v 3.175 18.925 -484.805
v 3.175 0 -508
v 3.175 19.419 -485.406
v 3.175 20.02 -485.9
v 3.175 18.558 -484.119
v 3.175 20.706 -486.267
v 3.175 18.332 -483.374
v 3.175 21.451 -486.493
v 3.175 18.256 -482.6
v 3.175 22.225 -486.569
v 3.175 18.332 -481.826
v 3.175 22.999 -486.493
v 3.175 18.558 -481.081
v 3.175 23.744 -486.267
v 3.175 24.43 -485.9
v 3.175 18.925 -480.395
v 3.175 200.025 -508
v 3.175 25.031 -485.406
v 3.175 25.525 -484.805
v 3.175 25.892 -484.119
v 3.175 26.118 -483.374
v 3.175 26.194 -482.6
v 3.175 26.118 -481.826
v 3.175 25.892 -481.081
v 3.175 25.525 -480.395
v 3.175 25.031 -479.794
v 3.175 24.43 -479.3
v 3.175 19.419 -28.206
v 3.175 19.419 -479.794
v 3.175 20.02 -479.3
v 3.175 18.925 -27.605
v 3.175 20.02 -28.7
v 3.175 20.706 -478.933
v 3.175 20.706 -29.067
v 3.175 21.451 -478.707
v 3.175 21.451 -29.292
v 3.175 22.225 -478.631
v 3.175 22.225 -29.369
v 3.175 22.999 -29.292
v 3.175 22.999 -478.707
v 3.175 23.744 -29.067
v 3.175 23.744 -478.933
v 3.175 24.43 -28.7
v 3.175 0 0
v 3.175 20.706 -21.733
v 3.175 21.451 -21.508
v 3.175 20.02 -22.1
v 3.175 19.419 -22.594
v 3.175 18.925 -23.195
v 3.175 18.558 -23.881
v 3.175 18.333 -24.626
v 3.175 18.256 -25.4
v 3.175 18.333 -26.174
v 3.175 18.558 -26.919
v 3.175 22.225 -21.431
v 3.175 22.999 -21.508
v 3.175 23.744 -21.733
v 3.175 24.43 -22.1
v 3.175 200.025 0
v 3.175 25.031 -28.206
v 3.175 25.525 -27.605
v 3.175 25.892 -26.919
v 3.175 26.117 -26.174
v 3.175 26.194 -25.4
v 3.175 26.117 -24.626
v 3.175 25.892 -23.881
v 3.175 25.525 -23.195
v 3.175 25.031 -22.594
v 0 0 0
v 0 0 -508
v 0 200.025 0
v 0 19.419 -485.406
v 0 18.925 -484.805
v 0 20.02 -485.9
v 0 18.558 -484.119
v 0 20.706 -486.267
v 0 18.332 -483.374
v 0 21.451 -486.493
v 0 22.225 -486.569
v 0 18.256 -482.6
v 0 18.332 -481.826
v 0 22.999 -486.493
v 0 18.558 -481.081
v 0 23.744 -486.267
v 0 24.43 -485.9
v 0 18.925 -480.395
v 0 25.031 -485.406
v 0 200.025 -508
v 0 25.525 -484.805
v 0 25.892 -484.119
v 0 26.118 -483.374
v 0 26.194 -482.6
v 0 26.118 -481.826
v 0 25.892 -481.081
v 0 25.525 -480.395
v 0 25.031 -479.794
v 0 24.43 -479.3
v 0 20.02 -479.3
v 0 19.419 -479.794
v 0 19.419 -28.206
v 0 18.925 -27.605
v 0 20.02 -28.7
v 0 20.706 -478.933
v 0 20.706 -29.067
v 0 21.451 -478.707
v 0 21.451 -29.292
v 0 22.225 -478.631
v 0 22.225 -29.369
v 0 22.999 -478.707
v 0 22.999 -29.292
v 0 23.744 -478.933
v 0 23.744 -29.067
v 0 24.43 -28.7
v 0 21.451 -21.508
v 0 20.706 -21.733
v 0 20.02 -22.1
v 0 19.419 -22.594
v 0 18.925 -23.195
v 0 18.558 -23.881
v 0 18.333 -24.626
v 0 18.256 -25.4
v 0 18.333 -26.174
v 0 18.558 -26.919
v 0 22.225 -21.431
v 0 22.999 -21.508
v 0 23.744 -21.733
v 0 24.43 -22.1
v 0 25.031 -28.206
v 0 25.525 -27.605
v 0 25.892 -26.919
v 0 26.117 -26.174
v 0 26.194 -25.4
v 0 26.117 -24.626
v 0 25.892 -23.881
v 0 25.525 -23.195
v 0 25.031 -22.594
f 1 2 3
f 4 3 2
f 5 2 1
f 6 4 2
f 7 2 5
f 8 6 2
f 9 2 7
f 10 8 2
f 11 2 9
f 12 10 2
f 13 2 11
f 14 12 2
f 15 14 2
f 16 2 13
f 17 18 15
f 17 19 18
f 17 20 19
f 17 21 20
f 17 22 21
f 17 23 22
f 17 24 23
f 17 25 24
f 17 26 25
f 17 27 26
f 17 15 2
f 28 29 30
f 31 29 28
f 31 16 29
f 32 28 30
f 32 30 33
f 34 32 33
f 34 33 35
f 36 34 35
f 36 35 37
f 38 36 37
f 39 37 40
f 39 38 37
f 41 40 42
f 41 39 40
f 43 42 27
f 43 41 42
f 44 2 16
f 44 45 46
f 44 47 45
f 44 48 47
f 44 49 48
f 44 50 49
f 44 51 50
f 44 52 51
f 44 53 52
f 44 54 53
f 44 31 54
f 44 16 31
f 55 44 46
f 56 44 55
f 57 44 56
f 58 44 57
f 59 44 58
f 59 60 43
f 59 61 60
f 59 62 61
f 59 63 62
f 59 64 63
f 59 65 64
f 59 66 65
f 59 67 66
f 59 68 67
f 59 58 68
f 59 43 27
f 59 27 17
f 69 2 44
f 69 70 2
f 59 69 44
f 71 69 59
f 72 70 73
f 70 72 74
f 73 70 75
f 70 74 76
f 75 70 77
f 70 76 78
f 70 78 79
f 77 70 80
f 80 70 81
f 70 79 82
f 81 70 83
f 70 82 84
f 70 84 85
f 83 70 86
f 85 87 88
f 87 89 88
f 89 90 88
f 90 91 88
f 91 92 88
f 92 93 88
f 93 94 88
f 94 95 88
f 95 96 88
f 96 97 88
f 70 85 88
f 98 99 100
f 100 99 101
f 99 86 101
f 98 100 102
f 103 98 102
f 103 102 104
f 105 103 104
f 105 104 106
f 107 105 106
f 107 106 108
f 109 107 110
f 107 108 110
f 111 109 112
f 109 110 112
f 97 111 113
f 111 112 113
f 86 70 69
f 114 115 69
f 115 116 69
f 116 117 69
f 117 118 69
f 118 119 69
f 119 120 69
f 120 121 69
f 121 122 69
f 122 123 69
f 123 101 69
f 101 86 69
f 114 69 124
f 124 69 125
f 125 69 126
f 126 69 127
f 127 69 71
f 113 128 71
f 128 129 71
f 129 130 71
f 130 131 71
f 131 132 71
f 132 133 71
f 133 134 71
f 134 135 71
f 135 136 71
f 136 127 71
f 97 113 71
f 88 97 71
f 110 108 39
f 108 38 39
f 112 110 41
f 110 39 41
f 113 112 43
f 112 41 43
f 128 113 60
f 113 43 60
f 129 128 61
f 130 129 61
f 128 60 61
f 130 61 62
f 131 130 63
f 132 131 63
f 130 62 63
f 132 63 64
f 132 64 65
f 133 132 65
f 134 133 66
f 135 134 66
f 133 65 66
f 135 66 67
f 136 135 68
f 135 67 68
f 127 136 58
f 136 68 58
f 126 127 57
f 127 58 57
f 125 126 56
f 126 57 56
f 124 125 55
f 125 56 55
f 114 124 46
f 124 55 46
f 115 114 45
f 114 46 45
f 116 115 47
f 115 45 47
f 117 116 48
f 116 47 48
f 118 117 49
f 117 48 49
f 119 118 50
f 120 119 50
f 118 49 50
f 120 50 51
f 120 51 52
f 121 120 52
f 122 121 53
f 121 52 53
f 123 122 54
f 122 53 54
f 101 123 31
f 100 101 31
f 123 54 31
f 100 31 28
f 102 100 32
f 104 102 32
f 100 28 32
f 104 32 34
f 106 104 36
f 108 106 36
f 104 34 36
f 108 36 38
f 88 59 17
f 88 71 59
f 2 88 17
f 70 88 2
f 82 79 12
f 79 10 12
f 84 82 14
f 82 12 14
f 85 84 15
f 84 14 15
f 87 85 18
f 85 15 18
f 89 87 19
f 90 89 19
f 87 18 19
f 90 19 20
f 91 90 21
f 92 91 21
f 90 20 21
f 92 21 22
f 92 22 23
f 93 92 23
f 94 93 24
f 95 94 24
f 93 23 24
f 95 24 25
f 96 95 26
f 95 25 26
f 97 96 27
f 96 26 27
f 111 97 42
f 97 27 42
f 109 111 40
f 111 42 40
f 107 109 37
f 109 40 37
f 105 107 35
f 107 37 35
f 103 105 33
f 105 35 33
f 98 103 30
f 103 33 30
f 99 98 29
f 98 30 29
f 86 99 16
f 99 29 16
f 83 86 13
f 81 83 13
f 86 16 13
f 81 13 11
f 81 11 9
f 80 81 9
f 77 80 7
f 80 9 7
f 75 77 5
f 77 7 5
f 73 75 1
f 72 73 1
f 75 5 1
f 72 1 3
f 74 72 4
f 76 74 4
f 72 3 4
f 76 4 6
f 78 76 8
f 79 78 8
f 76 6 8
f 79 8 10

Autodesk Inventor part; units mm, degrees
ref_plane "YZ Plane" through (0, 0, 0) normal (1, 0, 0) x (0, 1, 0)
ref_plane "XZ Plane" through (0, 0, 0) normal (0, 1, 0) x (-1, 0, 0)
ref_plane "XY Plane" through (0, 0, 0) normal (0, 0, 1) x (1, 0, 0)
sketch "Sketch1" plane through (0, 0, 0) normal (1, 0, 0) x (0, 1, 0)
  line L0 (0, 0) -> (200.025, 0)
  line L1 (200.025, 0) -> (200.025, -508)
  line L2 (200.025, -508) -> (0, -508)
  line L3 (0, -508) -> (0, 0)
  dimension "d0" = 200.025
  dimension "d1" = 508
extrude "Extrusion1" add sketch "Sketch1" along normal blind 3.175
sketch "Sketch3" plane through (3.175, 0, 0) normal (1, 0, 0) x (0, 0, -1)
  line L0 (0, 200.025) -> (0, 0) projected
  line L1 (0, 0) -> (0, 22.225)
  line L2 (0, 22.225) -> (25.4, 22.225)
  circle A0 centre (25.4, 22.225) radius 1.9844
  line L3 (0, 0) -> (508, 0) projected
  line L4 (508, 0) -> (508, 22.225)
  line L5 (508, 0) -> (508, 200.025) projected
  line L6 (508, 22.225) -> (482.6, 22.225)
  circle A1 centre (482.6, 22.225) radius 1.9844
  dimension "d8" = 22.225
  dimension "d9" = 25.4
  dimension "d10" = 3.9688
  dimension "d11" = 22.225
  dimension "d12" = 25.4
  dimension "d13" = 3.9688
extrude "Extrusion2" cut sketch "Sketch3" against normal blind 3.175 contours A0
sketch "Sketch4" plane through (3.175, 0, 0) normal (1, 0, 0) x (0, 0, -1)
  line L0 (508, 0) -> (0, 0) projected
  line L1 (508, 0) -> (508, 22.225)
  line L2 (508, 200.025) -> (508, 0) projected
  line L3 (508, 22.225) -> (482.6, 22.225)
  circle A0 centre (482.6, 22.225) radius 1.9844
  dimension "d16" = 22.225
  dimension "d17" = 25.4
  dimension "d18" = 3.9688
extrude "Extrusion3" cut sketch "Sketch4" against normal blind 3.175
sketch "Sketch5" plane through (3.175, 0, 0) normal (1, 0, 0) x (0, 0, -1)
  circle A0 centre (25.4, 22.225) radius 1.9844 projected
  circle A1 centre (25.4, 22.225) radius 3.9687
  point P0 (0, 0)
  dimension "d21" = 7.9375
extrude "Extrusion4" cut sketch "Sketch5" against normal blind 3.175
sketch "Sketch6" plane through (3.175, 0, 0) normal (1, 0, 0) x (0, 0, -1)
  circle A0 centre (482.6, 22.225) radius 1.9844 projected
  circle A1 centre (482.6, 22.225) radius 3.9688
  point P0 (0, 0)
  dimension "d24" = 7.9375
extrude "Extrusion5" cut sketch "Sketch6" against normal blind 3.175
properties part number "Side"
